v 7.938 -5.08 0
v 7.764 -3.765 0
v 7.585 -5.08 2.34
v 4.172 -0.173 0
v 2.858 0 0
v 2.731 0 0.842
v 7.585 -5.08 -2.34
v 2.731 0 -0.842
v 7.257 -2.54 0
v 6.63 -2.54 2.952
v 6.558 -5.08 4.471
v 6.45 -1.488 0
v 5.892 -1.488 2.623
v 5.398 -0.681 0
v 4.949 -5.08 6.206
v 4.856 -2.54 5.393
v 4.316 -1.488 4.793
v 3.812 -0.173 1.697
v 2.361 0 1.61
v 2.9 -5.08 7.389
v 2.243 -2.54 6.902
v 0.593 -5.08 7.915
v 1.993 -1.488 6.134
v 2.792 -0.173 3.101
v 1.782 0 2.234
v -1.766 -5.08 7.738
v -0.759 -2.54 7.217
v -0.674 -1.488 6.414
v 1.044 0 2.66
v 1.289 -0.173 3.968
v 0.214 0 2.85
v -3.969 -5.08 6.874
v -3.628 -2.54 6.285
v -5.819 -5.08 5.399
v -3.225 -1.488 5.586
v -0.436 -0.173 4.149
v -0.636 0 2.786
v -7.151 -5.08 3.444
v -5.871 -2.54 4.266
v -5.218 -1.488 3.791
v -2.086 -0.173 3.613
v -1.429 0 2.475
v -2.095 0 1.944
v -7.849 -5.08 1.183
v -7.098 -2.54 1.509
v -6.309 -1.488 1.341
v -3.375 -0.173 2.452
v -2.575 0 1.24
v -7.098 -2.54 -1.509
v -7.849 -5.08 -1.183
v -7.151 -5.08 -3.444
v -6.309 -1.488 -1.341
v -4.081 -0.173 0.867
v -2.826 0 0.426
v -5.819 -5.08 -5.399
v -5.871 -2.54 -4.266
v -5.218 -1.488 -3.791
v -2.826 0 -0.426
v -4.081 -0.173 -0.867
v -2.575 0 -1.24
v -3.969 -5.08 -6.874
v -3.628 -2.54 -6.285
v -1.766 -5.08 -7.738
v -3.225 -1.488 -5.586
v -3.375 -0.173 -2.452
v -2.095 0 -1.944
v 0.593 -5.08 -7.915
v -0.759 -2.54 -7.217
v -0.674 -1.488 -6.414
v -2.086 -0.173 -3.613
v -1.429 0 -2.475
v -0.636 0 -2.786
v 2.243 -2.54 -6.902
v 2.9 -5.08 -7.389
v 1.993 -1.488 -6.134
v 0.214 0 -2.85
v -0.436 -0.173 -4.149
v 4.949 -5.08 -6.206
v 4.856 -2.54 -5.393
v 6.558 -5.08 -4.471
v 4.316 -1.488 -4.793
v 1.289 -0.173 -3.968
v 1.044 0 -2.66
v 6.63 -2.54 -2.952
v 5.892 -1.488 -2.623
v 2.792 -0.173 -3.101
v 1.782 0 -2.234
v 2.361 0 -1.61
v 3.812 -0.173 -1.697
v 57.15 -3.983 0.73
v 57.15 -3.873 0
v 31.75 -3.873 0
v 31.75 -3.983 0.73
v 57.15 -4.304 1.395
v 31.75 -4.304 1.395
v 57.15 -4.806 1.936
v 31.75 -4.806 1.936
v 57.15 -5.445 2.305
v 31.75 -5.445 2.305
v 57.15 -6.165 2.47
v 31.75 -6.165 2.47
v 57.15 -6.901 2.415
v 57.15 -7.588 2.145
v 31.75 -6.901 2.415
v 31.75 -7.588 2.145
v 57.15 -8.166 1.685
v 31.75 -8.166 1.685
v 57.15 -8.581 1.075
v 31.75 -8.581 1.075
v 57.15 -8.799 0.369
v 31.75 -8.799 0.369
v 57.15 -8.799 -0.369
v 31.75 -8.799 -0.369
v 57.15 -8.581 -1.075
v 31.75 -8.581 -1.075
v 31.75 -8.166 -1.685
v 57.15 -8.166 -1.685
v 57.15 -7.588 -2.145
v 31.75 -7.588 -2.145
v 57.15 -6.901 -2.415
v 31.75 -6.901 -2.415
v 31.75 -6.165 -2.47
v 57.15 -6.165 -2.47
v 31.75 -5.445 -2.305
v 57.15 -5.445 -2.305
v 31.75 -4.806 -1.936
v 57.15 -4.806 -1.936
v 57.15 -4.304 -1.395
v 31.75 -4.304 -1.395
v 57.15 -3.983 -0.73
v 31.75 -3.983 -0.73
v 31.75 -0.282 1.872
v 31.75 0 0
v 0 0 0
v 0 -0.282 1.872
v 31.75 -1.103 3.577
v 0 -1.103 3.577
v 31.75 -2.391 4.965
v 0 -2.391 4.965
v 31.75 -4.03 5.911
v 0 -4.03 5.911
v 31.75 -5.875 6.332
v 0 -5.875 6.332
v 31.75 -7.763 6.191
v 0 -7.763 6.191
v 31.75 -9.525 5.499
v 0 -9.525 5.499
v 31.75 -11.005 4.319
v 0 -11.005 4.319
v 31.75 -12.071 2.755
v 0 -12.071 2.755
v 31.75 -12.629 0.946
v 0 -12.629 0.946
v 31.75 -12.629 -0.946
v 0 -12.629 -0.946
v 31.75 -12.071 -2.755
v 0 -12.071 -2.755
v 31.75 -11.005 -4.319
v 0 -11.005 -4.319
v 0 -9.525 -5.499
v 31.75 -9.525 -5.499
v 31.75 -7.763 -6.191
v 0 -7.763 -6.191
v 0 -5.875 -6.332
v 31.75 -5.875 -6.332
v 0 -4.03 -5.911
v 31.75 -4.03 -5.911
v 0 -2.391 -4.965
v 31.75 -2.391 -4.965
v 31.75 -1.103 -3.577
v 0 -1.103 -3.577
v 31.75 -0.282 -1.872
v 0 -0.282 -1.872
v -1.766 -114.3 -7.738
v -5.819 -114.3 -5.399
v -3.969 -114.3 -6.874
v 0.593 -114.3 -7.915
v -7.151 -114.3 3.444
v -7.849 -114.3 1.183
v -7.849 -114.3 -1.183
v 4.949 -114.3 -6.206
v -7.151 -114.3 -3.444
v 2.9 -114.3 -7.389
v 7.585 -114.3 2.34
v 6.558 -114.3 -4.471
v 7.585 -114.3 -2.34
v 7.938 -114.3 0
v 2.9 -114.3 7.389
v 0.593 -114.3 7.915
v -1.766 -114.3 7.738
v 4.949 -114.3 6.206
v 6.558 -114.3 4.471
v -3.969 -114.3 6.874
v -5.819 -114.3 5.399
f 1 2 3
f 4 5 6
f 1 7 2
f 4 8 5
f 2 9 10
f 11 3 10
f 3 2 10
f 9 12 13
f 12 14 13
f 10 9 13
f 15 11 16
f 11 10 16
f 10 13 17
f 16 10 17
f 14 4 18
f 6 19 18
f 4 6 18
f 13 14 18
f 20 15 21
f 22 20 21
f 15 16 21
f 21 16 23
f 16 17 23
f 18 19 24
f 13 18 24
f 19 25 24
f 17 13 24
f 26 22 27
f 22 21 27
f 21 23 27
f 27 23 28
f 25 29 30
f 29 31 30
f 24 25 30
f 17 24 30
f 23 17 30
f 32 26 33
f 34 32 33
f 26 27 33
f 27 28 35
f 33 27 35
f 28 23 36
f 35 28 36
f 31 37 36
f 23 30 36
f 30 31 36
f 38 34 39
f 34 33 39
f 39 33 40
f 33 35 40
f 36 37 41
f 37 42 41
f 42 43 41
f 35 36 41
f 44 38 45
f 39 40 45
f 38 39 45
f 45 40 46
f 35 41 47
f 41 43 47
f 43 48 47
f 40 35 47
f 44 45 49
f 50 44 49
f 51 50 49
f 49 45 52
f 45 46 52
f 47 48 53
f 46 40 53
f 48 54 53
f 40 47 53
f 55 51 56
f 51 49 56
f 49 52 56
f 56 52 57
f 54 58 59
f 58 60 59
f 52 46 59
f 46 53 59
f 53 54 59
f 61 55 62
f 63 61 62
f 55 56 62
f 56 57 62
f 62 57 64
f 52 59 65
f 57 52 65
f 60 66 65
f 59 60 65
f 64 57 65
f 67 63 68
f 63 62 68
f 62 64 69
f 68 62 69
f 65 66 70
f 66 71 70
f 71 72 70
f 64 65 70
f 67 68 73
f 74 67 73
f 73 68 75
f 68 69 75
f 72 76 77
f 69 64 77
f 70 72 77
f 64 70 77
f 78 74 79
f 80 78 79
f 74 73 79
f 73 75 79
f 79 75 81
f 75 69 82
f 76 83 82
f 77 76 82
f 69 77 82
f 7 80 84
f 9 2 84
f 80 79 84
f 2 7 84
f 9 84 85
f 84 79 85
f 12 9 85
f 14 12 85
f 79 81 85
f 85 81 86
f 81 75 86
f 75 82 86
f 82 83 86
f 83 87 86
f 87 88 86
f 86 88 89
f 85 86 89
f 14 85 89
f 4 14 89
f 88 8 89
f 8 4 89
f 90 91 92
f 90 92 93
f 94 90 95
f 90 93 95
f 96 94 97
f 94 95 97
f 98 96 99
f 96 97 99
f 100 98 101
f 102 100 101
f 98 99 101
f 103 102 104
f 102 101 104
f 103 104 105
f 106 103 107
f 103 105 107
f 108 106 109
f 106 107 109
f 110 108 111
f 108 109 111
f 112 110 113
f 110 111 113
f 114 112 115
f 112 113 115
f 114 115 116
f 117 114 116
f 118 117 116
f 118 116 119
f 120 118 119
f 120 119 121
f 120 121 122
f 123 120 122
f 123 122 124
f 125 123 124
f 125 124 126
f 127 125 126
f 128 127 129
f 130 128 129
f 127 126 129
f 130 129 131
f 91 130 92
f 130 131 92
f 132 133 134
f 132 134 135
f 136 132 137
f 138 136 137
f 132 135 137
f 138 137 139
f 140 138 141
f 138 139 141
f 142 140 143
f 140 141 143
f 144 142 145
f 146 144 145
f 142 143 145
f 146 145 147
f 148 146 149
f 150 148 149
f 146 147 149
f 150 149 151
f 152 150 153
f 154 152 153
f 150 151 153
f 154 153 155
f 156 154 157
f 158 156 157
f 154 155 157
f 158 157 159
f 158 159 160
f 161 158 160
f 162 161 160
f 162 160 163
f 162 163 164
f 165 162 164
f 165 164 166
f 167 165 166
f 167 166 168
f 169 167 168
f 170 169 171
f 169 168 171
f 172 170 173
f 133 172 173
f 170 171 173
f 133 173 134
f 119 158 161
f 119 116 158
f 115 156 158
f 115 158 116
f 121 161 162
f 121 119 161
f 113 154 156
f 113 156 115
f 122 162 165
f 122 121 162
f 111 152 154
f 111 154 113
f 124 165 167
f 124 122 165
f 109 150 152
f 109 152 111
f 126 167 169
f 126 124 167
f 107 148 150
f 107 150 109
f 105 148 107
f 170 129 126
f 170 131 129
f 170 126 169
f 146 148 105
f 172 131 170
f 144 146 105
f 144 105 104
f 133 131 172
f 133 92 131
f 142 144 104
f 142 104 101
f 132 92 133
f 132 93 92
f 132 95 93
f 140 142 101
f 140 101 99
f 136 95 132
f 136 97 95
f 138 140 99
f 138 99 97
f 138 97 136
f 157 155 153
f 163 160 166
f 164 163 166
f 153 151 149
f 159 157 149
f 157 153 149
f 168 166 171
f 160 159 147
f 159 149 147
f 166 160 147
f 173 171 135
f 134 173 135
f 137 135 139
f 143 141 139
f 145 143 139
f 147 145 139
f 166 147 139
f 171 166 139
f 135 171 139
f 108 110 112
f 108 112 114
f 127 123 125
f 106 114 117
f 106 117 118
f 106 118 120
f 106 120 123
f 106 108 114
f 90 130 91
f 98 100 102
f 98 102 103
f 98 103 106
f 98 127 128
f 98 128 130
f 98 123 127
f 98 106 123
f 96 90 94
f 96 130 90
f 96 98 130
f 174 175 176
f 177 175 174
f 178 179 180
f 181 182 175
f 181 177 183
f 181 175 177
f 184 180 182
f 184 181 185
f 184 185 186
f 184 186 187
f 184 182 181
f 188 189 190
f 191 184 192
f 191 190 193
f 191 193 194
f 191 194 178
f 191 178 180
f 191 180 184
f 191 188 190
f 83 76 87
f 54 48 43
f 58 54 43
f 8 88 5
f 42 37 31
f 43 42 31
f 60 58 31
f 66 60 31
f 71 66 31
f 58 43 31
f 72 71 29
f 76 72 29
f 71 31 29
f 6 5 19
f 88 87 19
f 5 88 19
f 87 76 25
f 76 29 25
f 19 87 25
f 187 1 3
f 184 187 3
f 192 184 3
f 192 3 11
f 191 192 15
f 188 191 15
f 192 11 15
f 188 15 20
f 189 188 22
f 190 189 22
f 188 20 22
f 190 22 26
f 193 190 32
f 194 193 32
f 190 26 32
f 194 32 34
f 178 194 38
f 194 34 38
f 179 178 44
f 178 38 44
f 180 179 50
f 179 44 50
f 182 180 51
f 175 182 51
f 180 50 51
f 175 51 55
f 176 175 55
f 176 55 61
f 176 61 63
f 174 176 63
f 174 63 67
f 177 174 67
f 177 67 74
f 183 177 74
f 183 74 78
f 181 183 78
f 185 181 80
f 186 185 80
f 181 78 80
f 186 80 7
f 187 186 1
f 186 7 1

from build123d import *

# Parameters (mm, degrees)
F0_R     = 7.9375
F1_DEPTH = 114.3
F2_R     = 6.35
F3_DEPTH = 31.75
F4_R     = 5.08
F5_R     = 2.476668
F6_DEPTH = 25.4


with BuildPart() as f1:
    # F0 (on Front) → F1 (new body)
    with BuildSketch(Plane.XZ):
        Circle(F0_R)
    extrude(amount=F1_DEPTH)

    # F4
    f4_edges = [f1.edges().sort_by_distance(p)[0] for p in [
        (-7.9375, 0, 0),
    ]]
    fillet(f4_edges, radius=F4_R)


with BuildPart() as f3:
    # F2 (on Right) → F3 (new body)
    with BuildSketch(Plane.YZ):
        with Locations((-6.35, 0)):
            Circle(F2_R)
    extrude(amount=F3_DEPTH)

    # F5 (on face) → F6 (join)
    with BuildSketch(Plane.YZ.offset(31.75)):
        with Locations((-6.35, 0)):
            Circle(F5_R)
    extrude(amount=F6_DEPTH)


solid = Compound([f1.part, f3.part])
